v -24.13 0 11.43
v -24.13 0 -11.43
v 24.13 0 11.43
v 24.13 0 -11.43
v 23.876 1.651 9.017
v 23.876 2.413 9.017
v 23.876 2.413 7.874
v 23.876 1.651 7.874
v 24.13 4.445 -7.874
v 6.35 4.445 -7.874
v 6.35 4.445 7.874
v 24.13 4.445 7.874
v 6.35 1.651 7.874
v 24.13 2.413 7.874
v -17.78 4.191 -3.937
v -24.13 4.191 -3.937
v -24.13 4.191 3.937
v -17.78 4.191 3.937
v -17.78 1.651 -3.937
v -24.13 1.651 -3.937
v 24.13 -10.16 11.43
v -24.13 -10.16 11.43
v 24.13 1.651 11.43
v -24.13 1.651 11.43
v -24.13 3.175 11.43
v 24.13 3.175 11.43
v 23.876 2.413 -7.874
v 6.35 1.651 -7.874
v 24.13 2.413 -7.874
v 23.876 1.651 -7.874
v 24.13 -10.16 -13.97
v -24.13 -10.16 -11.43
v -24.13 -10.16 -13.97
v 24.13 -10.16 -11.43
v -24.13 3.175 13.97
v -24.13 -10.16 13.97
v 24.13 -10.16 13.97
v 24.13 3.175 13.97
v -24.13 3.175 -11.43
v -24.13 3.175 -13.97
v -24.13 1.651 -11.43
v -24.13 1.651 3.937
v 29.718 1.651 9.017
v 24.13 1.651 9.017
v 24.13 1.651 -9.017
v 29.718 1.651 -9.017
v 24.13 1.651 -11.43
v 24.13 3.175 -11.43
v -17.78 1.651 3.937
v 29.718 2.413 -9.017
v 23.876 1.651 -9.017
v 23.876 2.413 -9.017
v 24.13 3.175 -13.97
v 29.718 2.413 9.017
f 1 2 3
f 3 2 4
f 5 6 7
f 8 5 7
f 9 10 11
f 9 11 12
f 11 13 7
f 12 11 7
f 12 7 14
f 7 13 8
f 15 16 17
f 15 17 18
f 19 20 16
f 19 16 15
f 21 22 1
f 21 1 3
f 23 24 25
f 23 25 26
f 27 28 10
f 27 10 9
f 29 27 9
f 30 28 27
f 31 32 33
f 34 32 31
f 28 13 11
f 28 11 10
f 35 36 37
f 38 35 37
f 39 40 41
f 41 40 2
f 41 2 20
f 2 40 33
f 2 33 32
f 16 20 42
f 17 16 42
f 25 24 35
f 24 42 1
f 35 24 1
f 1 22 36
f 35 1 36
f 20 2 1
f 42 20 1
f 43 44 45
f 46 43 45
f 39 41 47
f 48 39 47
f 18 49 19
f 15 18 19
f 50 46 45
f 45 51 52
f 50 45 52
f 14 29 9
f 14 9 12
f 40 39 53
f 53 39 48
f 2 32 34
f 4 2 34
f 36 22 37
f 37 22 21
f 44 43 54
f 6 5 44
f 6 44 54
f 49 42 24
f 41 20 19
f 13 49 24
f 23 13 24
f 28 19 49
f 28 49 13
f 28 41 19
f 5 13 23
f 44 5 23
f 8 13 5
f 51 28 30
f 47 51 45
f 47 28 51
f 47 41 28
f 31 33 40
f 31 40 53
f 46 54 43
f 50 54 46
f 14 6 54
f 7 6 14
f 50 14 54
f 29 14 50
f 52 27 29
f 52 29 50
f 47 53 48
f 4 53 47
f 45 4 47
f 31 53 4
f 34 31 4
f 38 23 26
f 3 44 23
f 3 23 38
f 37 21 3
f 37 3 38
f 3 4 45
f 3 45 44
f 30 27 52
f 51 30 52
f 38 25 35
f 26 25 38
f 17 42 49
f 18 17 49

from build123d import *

# Parameters (mm, degrees)
SKETCH1_W                = 48.26
SKETCH1_H                = 27.94
BOSS_EXTRUDE1_DEPTH      = 1.651
BOSS_EXTRUDE2_START      = -11.811
SKETCH2_W                = 48.26
SKETCH2_H                = 2.54
BOSS_EXTRUDE2_DEPTH      = 13.335
SKETCH3_W                = 17.78
SKETCH3_H                = 15.748
BOSS_EXTRUDE3_DEPTH      = 2.794
BOSS_EXTRUDE6_DEPTH      = 5.588
BOSS_EXTRUDE6_DEPTH_BACK = 0.254
SKETCH4_W                = 18.034
SKETCH4_H                = 0.762
SKETCH5_W                = 6.35
SKETCH5_H                = 7.874
BOSS_EXTRUDE7_DEPTH      = 2.54


with BuildPart() as part:
    # Sketch1 → Boss-Extrude1 (new body)
    with BuildSketch(Plane(origin=(0, 0, 0), x_dir=(1, 0, 0), z_dir=(0, 1, 0))):
        Rectangle(SKETCH1_W, SKETCH1_H)
    extrude(amount=BOSS_EXTRUDE1_DEPTH)

    # Sketch2 → Boss-Extrude2 (add)
    with BuildSketch(Plane(origin=(0, 1.651, 0), x_dir=(1, 0, 0), z_dir=(0, 1, 0)).offset(BOSS_EXTRUDE2_START)):
        with Locations((0, -12.7)):
            Rectangle(SKETCH2_W, SKETCH2_H)
    boss_extrude2 = extrude(amount=BOSS_EXTRUDE2_DEPTH)

    # Mirror1: Boss-Extrude2 across plane
    add(boss_extrude2.mirror(Plane.XY))

    # Sketch3 → Boss-Extrude3 (add)
    with BuildSketch(Plane(origin=(0, 1.651, 0), x_dir=(1, 0, 0), z_dir=(0, 1, 0))):
        with Locations((15.24, 0)):
            Rectangle(SKETCH3_W, SKETCH3_H)
    extrude(amount=BOSS_EXTRUDE3_DEPTH)

    # Sketch4 → Boss-Extrude6 (add, two sides: drawn at the far end of the back side and taken through both)
    with BuildSketch(Plane(origin=(24.13, 0, 0), x_dir=(0, 0, -1), z_dir=(1, 0, 0)).offset(-BOSS_EXTRUDE6_DEPTH_BACK)):
        with Locations((0, 2.032)):
            Rectangle(SKETCH4_W, SKETCH4_H)
    extrude(amount=BOSS_EXTRUDE6_DEPTH + BOSS_EXTRUDE6_DEPTH_BACK)

    # Sketch5 → Boss-Extrude7 (add)
    with BuildSketch(Plane(origin=(0, 1.651, 0), x_dir=(1, 0, 0), z_dir=(0, 1, 0))):
        with Locations((-20.955, 0)):
            Rectangle(SKETCH5_W, SKETCH5_H)
    extrude(amount=BOSS_EXTRUDE7_DEPTH)


solid = part.part
